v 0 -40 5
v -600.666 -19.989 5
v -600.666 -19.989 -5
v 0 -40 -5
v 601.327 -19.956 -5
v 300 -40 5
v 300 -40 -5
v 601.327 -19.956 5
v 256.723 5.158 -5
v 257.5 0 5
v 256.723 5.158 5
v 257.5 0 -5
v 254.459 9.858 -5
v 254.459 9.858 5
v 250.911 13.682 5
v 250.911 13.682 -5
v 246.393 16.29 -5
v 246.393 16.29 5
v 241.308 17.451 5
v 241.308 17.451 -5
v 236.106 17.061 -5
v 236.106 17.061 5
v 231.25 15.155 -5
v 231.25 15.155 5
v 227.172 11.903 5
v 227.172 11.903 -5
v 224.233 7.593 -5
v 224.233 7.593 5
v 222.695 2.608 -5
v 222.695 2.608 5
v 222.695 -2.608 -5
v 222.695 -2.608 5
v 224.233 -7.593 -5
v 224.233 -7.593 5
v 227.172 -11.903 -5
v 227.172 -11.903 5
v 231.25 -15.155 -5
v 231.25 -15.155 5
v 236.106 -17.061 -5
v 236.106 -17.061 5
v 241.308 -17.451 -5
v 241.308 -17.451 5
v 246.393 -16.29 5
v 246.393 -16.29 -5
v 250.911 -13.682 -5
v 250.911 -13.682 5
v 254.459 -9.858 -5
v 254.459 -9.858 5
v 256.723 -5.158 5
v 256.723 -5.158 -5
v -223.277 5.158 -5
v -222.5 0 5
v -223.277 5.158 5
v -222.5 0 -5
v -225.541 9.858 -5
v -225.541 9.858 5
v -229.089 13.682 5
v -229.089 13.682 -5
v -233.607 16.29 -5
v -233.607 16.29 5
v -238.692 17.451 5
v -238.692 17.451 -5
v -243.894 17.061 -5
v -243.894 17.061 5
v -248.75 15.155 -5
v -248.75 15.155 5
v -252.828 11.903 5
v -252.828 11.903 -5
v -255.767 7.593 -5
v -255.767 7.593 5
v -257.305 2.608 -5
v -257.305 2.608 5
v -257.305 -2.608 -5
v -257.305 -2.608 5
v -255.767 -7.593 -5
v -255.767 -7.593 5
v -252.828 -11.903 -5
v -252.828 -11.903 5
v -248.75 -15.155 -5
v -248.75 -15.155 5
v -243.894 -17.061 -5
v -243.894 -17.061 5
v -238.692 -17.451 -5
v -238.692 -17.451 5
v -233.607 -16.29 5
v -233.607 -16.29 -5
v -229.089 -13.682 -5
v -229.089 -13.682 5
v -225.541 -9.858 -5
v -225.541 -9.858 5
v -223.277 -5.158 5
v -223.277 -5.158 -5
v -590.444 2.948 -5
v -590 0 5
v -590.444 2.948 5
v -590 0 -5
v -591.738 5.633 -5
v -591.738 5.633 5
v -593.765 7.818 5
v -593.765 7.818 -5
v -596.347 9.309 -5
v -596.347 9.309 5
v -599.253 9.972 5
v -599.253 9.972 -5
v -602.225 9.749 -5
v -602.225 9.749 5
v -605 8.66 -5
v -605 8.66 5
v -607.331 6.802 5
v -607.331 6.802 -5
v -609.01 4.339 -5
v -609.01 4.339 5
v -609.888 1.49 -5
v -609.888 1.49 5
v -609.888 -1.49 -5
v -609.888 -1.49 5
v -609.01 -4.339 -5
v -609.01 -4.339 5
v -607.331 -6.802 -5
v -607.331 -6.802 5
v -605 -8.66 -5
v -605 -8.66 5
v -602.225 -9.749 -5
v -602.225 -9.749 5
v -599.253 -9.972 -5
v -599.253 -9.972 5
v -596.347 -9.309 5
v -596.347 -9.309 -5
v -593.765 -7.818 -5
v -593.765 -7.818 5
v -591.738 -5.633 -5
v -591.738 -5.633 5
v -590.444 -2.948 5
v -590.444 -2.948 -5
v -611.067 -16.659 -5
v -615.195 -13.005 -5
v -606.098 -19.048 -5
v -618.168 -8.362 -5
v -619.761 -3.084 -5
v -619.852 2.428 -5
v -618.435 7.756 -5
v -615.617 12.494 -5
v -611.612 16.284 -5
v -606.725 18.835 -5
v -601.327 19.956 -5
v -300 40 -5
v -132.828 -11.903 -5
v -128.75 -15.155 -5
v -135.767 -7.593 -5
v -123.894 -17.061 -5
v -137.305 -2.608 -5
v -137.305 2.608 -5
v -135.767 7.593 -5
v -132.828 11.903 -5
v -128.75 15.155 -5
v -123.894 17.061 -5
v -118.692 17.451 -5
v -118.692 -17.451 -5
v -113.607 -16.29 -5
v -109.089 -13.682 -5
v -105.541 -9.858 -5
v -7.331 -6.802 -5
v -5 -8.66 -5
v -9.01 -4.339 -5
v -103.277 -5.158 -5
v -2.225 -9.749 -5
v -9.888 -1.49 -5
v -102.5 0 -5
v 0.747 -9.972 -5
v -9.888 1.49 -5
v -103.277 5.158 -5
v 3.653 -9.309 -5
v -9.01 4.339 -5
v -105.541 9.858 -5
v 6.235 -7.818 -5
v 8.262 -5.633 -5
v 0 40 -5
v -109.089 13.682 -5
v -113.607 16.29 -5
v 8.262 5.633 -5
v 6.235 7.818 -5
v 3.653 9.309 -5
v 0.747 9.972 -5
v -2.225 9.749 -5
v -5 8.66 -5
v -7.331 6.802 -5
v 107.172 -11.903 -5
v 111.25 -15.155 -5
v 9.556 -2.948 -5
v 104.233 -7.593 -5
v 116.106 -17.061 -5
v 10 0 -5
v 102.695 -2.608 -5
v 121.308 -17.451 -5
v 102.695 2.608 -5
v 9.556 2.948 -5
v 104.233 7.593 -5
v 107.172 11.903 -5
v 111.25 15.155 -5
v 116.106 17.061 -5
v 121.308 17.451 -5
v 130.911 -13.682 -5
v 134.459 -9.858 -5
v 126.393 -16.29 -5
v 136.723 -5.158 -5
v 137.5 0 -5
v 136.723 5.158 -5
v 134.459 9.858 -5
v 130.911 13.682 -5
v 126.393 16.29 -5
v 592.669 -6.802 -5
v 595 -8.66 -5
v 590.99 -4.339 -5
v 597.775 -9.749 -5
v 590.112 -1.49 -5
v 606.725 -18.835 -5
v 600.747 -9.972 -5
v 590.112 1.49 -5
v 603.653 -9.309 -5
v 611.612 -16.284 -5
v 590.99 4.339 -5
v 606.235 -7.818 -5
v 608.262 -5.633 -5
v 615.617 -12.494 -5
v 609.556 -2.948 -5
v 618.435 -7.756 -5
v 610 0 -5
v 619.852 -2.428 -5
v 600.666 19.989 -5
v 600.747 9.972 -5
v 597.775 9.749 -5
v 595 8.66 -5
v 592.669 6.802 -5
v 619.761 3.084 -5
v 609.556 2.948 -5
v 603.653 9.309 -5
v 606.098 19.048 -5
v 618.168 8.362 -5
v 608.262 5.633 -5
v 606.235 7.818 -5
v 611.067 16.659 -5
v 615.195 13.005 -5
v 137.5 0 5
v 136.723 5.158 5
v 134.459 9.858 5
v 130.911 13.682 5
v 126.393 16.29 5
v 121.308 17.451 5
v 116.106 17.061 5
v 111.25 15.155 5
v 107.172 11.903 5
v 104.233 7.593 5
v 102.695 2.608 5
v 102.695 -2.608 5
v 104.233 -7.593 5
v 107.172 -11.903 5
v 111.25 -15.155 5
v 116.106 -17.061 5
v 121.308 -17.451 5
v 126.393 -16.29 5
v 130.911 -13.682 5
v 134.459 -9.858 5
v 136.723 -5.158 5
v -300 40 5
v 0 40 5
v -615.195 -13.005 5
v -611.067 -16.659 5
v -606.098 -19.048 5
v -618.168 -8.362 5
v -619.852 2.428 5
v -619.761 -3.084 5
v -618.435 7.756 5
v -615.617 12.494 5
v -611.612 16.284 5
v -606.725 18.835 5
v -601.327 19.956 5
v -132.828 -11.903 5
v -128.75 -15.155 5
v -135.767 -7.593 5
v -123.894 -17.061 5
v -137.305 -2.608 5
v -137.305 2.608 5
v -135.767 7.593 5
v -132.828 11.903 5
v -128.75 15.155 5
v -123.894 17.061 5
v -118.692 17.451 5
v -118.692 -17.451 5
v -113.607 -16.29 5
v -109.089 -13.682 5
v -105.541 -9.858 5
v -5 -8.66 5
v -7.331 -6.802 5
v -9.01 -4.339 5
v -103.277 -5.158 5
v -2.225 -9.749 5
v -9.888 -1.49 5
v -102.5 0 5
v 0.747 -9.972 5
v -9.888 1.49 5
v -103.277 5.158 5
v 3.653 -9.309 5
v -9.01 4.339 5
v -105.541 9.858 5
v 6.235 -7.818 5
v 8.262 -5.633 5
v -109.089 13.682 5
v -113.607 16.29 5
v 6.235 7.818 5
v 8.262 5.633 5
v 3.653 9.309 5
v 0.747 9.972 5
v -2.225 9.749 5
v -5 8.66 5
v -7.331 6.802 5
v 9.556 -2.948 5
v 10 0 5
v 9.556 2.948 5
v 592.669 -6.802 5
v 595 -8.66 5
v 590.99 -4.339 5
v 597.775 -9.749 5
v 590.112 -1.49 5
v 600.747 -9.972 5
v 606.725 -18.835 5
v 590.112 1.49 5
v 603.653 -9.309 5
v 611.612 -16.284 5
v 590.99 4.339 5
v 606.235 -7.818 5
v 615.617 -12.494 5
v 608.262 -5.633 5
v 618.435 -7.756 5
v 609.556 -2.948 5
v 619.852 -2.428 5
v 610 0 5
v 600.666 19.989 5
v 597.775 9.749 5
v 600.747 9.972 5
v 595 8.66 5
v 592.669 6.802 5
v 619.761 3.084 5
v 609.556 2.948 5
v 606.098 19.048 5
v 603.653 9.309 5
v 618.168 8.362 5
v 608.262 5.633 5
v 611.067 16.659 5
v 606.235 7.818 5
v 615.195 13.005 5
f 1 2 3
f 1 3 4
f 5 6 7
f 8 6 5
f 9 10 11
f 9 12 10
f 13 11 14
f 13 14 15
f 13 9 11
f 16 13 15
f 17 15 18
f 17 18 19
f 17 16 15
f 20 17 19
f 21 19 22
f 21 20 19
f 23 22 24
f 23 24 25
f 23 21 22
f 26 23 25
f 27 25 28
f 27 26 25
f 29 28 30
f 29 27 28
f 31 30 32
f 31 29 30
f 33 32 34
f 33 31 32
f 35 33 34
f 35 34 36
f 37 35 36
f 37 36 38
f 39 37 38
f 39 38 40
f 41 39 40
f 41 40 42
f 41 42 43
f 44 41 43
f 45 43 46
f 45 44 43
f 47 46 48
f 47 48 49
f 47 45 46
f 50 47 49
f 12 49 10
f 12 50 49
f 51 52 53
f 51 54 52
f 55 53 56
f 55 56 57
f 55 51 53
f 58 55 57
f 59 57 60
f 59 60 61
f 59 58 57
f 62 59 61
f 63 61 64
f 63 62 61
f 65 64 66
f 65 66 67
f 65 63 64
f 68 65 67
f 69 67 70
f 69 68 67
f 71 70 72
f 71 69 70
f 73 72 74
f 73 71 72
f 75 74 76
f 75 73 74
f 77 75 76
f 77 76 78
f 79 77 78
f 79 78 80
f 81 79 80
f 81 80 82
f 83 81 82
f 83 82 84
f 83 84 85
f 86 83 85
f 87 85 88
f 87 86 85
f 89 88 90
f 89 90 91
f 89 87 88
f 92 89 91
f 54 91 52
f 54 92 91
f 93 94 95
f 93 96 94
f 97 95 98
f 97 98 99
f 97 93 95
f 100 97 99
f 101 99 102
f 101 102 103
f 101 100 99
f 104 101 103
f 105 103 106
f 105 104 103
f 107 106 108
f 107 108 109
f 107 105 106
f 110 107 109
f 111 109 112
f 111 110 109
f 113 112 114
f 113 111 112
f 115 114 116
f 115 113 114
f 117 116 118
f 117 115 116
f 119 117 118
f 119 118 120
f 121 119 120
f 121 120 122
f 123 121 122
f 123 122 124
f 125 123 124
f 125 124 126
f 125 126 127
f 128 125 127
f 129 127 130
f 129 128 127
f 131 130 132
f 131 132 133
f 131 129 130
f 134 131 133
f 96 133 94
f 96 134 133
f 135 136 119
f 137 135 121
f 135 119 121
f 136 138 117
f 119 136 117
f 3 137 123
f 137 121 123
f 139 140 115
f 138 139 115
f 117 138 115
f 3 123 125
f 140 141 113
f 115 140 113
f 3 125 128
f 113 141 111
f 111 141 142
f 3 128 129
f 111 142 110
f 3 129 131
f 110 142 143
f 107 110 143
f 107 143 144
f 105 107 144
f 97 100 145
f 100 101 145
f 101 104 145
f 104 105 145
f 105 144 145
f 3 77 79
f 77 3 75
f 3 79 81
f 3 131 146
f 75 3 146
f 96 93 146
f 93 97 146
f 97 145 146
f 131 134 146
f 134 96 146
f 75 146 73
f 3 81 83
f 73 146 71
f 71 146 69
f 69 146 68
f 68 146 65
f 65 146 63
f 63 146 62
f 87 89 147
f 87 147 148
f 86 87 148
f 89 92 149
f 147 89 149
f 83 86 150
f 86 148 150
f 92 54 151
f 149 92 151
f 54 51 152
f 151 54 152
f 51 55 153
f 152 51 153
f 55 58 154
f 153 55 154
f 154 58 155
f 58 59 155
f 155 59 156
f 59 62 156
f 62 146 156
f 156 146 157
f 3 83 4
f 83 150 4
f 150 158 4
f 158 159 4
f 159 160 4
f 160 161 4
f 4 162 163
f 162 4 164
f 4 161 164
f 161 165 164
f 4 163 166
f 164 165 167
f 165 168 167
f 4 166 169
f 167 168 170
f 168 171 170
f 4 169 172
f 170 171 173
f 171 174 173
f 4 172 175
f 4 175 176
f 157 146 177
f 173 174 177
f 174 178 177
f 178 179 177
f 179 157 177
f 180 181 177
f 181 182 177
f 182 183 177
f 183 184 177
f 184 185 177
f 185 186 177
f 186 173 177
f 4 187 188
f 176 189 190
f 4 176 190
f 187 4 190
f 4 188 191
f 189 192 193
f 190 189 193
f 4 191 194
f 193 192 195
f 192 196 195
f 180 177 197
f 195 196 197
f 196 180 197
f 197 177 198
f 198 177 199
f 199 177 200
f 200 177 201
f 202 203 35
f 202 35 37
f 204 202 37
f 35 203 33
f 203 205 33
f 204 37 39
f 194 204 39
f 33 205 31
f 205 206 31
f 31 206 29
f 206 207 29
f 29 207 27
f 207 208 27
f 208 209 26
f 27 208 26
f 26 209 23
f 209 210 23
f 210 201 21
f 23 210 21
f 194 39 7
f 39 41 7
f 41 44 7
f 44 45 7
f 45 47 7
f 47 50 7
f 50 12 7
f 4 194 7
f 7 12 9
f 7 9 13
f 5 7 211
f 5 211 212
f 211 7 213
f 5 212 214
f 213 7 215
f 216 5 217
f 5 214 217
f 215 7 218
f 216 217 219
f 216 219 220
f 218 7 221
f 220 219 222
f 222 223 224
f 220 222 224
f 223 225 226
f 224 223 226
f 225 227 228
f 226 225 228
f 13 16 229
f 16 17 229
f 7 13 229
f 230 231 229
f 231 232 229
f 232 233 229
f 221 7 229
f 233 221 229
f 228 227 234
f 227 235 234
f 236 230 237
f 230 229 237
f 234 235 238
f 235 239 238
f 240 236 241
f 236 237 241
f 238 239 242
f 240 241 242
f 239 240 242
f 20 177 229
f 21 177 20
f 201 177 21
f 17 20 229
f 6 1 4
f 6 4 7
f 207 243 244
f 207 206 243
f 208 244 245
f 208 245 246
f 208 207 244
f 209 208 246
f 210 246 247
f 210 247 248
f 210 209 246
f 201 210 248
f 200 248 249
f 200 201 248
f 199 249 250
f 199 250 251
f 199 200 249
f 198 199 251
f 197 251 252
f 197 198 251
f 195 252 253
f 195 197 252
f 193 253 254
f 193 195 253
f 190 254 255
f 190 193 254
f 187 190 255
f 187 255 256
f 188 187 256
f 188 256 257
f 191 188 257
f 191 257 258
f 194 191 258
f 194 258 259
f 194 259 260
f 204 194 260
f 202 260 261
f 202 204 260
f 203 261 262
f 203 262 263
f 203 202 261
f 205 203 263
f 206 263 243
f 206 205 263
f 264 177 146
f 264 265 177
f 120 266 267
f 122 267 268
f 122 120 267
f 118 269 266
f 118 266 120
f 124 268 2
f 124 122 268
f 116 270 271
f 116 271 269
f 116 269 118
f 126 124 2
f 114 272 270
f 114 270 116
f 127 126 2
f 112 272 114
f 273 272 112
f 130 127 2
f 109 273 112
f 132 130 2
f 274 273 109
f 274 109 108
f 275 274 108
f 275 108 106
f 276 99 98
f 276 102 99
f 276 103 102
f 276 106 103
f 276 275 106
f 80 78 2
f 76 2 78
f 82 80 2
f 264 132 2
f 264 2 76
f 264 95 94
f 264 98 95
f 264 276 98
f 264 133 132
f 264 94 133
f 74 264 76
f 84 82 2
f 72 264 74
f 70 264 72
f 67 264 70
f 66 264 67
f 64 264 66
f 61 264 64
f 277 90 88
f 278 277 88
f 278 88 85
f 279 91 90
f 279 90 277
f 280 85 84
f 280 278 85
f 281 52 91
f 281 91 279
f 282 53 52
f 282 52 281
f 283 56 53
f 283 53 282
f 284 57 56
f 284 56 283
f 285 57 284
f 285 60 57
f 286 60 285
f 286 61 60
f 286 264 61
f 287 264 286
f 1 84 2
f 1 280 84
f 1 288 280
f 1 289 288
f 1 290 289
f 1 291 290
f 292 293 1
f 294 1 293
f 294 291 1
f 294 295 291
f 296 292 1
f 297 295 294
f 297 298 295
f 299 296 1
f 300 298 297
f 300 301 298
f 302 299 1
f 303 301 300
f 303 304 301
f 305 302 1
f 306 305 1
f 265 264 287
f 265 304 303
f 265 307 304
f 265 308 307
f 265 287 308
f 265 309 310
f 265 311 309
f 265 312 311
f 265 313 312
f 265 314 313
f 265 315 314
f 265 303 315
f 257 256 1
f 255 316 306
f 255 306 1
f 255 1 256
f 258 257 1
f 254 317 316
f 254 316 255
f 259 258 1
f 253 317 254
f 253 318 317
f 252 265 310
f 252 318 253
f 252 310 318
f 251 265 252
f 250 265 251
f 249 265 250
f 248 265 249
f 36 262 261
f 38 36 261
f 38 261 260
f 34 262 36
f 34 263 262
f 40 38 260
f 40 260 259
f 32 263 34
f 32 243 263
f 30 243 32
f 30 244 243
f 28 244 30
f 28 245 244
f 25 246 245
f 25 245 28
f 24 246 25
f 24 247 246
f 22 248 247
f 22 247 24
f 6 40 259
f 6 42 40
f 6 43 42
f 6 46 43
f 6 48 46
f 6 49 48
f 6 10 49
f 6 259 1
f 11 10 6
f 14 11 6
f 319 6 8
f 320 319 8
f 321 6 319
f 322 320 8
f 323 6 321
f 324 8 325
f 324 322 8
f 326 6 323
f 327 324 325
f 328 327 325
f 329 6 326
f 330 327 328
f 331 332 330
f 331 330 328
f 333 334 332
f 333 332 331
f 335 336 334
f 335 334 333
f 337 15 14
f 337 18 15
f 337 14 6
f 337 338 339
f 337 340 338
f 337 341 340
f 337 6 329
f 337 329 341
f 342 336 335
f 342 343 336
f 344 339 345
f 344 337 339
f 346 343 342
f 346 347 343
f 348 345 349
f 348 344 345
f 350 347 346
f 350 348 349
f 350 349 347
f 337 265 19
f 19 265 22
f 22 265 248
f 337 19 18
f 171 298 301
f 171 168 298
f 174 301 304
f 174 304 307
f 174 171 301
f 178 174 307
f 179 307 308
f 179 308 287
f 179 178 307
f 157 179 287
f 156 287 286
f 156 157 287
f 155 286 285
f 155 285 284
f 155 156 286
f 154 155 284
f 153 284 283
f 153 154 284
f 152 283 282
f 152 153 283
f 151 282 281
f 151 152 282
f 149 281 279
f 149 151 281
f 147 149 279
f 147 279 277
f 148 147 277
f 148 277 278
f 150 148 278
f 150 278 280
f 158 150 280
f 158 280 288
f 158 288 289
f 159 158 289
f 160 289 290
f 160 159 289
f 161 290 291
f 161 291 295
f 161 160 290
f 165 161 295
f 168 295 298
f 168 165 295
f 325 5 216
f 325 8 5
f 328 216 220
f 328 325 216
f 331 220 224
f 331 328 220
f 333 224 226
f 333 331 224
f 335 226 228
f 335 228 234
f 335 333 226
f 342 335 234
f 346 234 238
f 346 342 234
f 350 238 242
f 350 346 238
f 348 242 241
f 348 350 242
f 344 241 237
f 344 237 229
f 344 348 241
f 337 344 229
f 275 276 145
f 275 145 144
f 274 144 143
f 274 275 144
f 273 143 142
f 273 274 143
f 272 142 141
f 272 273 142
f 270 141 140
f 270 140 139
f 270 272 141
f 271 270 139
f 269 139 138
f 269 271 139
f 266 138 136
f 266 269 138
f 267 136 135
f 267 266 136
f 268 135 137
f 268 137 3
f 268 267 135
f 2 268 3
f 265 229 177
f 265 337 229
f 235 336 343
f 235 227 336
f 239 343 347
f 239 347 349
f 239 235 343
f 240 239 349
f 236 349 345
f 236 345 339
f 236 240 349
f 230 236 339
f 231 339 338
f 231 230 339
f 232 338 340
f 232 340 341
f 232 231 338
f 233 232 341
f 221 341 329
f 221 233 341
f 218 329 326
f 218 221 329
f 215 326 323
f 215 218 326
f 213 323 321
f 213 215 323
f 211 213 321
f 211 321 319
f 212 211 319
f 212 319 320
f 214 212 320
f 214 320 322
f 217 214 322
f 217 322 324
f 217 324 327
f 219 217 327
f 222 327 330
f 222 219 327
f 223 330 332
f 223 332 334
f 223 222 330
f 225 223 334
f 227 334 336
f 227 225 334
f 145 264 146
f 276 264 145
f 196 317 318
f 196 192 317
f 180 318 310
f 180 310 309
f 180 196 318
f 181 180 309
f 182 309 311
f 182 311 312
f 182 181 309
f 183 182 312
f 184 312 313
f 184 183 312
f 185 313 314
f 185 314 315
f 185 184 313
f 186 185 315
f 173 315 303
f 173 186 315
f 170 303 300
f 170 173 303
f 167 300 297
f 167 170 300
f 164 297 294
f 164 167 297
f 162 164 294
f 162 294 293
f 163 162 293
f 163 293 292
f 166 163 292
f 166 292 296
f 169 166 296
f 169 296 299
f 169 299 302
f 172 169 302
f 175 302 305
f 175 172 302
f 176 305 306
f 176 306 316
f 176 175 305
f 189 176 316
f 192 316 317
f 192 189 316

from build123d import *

# Parameters (mm, degrees)
SKETCH1_R           = 10
SKETCH1_R_2         = 17.5
BOSS_EXTRUDE1_DEPTH = 5


with BuildPart() as part:
    # Sketch1 → Boss-Extrude1 (new body, symmetric)
    with BuildSketch(Plane.XY):
        with BuildLine():
            Line((0, 40), (-300, 40))
            Line((-300, 40), (-601.327453078, 19.955898084))
            ThreePointArc((-601.327453078, 19.955898084), (-619.997257899, -0.331174458), (-600.665927363, -19.988910444))
            Line((-600.665927363, -19.988910444), (0, -40))
            Line((0, -40), (300, -40))
            Line((300, -40), (601.327453078, -19.955898084))
            ThreePointArc((601.327453078, -19.955898084), (619.997257899, 0.331174458), (600.665927363, 19.988910444))
            Line((600.665927363, 19.988910444), (0, 40))
        make_face()
        with Locations((-600, 0)):
            Circle(SKETCH1_R, mode=Mode.SUBTRACT)
        with Locations((600, 0)):
            Circle(SKETCH1_R, mode=Mode.SUBTRACT)
        Circle(SKETCH1_R, mode=Mode.SUBTRACT)
        with Locations((-120, 0)):
            Circle(SKETCH1_R_2, mode=Mode.SUBTRACT)
        with Locations((-240, 0)):
            Circle(SKETCH1_R_2, mode=Mode.SUBTRACT)
        with Locations((120, 0)):
            Circle(SKETCH1_R_2, mode=Mode.SUBTRACT)
        with Locations((240, 0)):
            Circle(SKETCH1_R_2, mode=Mode.SUBTRACT)
    extrude(amount=BOSS_EXTRUDE1_DEPTH, both=True)


solid = part.part
